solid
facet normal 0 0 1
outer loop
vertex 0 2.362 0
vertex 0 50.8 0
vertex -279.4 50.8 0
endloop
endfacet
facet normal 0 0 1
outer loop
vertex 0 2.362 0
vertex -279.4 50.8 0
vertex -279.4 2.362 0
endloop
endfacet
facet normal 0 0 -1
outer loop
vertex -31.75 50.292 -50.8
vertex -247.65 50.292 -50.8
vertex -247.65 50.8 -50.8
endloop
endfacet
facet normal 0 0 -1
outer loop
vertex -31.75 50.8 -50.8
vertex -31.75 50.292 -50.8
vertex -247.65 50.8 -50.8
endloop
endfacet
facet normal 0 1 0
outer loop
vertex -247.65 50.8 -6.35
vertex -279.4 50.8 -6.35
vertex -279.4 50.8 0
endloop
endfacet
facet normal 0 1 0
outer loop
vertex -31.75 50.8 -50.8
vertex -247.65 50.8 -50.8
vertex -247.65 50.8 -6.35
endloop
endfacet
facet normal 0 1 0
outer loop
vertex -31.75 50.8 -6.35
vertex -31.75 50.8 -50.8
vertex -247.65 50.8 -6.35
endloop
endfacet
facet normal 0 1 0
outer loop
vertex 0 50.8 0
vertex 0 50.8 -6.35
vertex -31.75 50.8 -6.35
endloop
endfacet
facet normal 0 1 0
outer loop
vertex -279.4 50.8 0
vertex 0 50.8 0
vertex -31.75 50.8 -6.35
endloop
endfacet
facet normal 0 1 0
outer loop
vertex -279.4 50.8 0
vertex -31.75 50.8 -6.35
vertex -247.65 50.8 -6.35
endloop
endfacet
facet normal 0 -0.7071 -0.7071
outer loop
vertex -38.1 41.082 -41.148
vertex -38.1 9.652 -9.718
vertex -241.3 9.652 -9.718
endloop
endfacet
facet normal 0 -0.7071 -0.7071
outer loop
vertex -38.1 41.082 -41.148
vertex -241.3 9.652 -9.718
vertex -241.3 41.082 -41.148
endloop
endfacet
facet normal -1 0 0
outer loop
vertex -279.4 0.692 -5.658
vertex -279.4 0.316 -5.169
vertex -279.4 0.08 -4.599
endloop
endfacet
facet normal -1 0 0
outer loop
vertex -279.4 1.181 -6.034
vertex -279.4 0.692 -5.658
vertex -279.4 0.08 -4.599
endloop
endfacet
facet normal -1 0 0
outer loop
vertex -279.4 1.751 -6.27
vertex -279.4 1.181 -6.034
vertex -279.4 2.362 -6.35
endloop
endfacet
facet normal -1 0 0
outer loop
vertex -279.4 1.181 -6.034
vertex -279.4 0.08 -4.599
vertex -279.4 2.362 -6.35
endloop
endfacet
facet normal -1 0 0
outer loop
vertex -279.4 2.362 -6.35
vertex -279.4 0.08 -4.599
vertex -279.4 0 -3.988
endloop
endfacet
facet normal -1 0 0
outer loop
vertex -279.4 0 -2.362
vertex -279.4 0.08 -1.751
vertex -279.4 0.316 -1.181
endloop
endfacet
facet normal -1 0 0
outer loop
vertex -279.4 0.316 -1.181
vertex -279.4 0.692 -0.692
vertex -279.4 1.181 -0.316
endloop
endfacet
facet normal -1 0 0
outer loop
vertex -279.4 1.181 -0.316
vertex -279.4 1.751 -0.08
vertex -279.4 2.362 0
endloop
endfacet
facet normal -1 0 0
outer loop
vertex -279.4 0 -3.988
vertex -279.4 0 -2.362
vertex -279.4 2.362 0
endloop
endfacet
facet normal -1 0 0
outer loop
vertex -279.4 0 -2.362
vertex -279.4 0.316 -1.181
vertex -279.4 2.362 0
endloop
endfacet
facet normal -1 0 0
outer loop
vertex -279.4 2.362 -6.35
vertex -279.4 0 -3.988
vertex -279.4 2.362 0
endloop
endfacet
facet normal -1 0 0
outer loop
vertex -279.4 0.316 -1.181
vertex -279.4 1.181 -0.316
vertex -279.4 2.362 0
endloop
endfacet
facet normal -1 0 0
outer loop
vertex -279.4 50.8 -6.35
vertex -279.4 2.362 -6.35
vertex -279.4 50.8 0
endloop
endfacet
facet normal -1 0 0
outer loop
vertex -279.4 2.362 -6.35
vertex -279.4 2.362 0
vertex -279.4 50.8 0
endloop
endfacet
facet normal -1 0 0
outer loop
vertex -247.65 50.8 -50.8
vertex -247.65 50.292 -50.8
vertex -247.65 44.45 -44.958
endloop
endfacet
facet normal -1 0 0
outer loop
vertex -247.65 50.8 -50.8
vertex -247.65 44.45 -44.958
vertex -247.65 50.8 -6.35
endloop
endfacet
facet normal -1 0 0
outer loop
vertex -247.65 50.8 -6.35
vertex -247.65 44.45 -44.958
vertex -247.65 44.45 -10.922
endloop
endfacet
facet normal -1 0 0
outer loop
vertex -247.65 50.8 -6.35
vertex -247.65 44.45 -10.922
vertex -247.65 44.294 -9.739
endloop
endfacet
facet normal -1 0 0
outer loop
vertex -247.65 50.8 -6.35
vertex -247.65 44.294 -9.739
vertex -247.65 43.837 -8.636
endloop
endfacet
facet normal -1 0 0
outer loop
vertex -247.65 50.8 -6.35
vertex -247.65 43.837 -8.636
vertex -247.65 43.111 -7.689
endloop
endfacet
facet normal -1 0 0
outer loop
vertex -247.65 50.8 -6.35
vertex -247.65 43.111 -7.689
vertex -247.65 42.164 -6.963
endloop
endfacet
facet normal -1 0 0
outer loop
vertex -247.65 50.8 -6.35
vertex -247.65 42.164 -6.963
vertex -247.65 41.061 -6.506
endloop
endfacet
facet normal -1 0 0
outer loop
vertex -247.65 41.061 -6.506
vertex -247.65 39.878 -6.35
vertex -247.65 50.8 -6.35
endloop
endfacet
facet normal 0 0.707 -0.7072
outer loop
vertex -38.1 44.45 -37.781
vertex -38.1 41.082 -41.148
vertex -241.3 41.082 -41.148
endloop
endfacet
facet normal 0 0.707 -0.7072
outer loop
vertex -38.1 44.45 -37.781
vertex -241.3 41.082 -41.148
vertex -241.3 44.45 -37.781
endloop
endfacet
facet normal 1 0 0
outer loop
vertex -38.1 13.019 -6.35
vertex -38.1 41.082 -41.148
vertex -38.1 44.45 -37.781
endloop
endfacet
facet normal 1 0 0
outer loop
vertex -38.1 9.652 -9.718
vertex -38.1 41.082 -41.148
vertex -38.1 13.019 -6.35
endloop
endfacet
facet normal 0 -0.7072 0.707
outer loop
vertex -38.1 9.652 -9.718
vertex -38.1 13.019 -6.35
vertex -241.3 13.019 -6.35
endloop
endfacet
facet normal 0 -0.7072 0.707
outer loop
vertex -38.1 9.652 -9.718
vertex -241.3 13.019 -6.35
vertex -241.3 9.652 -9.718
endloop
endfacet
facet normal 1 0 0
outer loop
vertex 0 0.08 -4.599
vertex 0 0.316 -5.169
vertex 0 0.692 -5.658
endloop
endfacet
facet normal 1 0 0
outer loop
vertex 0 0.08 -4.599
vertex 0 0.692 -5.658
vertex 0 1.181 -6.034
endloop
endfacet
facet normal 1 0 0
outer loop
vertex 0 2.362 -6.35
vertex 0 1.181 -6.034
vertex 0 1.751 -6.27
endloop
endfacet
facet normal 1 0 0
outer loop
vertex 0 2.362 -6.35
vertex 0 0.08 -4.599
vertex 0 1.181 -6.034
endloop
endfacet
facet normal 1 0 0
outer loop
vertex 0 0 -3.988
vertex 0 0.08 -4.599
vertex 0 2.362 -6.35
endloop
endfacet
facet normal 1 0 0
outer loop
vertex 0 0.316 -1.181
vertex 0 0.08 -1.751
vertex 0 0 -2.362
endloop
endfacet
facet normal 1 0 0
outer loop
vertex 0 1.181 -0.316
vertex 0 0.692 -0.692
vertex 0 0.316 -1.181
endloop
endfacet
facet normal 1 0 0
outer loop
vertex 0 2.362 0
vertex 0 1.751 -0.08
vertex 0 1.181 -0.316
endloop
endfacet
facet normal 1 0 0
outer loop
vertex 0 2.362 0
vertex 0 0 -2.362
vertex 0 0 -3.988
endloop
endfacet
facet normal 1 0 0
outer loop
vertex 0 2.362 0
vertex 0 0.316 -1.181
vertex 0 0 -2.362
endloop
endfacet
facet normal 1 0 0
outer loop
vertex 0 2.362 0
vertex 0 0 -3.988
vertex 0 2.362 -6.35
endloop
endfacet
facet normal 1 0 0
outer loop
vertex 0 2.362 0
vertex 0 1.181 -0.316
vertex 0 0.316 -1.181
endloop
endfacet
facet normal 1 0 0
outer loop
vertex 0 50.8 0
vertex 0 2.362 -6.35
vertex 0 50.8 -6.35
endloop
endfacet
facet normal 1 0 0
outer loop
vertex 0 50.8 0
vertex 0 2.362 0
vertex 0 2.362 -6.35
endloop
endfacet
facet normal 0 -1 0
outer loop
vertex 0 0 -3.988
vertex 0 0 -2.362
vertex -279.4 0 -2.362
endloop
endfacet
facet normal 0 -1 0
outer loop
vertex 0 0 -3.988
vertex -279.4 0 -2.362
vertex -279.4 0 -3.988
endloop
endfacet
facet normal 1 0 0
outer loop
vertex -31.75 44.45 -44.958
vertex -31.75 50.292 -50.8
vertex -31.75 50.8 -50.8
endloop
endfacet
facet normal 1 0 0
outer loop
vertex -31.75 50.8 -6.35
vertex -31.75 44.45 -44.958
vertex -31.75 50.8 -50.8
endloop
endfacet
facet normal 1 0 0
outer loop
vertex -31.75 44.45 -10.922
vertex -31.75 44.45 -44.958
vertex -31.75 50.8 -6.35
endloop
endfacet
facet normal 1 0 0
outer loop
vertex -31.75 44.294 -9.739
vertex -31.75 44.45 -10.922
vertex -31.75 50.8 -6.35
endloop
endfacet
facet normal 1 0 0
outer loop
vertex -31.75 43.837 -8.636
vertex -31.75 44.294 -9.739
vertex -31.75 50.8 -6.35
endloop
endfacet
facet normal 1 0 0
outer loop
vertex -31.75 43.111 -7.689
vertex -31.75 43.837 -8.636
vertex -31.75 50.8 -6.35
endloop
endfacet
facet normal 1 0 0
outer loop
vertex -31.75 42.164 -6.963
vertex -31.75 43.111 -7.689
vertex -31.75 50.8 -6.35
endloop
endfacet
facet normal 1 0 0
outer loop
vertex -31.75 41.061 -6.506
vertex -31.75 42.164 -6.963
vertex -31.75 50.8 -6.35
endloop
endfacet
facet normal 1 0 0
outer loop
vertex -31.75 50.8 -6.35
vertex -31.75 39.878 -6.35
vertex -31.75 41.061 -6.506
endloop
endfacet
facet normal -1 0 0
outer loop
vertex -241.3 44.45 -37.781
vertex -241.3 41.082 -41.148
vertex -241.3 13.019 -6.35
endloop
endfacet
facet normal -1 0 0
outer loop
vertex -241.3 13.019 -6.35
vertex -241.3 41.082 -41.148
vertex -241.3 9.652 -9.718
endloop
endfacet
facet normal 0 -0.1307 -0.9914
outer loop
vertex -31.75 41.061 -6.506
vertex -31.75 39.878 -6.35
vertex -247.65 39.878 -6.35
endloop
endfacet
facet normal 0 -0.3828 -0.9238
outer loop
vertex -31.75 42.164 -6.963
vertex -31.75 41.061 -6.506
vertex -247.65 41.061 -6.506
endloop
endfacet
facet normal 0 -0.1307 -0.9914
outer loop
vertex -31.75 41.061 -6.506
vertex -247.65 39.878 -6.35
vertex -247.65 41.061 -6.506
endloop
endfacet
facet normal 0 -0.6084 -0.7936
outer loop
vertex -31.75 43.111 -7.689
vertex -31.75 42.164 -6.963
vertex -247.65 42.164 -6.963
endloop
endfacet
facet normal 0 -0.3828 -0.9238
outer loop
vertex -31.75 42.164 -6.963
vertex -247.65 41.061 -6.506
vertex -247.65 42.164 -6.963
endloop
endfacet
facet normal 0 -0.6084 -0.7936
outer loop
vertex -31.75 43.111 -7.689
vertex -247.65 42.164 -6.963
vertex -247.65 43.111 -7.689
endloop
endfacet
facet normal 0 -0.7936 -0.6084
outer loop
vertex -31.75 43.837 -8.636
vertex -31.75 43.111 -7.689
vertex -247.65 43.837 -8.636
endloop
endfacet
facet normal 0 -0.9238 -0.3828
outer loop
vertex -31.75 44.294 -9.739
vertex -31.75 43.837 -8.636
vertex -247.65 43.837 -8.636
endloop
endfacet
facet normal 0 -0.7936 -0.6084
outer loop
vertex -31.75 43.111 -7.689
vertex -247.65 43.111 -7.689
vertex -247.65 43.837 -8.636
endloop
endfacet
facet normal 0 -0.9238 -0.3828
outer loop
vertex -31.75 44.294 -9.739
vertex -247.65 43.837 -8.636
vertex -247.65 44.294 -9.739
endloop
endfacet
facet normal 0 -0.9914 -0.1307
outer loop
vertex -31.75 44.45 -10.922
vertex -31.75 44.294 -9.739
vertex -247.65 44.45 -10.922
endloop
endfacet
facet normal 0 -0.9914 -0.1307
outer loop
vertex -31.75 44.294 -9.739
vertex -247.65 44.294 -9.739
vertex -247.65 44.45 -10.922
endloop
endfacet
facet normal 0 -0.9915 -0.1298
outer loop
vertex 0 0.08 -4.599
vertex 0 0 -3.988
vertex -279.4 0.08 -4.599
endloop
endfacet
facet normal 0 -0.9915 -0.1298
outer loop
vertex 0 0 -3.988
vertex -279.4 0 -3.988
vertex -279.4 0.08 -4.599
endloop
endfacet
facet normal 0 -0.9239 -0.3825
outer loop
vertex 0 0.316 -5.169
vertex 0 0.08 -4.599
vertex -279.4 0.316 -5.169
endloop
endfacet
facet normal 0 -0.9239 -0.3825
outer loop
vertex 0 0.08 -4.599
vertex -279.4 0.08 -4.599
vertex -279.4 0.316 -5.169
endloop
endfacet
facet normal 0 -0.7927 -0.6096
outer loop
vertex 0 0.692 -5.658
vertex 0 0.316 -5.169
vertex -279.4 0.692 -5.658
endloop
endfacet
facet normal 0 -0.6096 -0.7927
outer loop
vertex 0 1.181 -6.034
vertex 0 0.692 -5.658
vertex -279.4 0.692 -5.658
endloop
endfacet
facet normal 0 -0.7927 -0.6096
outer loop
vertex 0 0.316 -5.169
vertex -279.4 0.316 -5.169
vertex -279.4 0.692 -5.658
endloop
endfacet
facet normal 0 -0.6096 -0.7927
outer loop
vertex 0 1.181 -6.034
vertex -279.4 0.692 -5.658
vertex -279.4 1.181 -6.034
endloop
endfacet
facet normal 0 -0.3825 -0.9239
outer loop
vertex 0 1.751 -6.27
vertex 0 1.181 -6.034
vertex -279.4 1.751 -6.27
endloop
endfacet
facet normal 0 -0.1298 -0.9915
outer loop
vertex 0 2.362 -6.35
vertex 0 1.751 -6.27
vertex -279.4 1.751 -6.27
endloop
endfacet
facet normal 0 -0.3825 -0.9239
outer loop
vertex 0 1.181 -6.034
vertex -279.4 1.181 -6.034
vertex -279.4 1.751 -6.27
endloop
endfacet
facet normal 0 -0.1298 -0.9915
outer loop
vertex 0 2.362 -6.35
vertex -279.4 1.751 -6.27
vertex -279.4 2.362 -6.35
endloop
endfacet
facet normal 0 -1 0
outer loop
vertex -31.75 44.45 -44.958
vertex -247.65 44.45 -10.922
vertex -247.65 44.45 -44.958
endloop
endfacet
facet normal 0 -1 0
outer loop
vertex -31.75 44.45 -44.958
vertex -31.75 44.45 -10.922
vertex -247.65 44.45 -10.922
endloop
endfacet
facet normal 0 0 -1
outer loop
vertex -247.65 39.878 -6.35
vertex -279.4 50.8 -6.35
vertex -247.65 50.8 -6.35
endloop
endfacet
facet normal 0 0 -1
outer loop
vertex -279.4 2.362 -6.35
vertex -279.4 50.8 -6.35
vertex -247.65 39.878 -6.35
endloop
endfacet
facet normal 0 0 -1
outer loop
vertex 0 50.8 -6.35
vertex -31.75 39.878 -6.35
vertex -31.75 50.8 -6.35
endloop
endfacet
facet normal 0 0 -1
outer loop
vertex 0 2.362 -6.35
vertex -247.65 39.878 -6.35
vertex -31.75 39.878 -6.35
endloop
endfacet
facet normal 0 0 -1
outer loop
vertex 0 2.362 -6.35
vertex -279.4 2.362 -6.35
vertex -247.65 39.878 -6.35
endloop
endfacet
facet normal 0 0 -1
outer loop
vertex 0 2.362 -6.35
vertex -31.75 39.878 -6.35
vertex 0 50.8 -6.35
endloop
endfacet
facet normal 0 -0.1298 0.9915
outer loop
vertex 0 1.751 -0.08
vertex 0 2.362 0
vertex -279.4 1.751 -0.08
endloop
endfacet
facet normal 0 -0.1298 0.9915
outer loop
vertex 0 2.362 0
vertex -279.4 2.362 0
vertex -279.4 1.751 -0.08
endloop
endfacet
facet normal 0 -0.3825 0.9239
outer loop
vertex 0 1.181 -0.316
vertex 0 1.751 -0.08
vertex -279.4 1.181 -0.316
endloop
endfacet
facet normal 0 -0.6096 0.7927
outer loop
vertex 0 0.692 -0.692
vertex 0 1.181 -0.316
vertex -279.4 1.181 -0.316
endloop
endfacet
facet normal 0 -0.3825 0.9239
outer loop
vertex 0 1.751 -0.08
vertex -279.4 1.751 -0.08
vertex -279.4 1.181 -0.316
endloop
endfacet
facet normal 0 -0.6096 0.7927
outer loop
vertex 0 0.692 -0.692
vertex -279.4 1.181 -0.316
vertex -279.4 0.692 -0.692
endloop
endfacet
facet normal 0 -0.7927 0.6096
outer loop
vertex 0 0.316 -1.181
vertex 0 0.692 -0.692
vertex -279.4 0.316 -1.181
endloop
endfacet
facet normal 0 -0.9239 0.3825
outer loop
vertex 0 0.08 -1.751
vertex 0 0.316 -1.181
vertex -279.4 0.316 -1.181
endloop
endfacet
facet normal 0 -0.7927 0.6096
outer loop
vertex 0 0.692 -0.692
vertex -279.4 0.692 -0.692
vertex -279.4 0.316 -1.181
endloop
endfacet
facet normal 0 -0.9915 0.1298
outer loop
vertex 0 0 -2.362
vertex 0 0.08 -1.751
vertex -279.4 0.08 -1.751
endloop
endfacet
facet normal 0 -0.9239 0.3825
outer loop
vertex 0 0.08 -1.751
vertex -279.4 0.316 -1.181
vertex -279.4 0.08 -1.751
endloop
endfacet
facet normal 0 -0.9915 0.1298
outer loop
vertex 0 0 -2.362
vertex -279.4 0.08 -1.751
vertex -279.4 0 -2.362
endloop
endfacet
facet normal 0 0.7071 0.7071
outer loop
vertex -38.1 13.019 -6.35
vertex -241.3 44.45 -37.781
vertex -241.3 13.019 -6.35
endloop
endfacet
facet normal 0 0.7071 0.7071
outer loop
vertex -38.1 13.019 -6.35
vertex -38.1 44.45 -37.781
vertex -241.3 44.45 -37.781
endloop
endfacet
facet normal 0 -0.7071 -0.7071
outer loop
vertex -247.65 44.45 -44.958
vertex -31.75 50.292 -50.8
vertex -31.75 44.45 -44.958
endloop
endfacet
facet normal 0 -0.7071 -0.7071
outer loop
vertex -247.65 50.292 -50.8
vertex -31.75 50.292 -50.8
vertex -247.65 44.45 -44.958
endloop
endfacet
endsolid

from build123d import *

# Parameters (mm, degrees)
F1_DEPTH  = 279.4
F2_R      = 2.3622
F4_DEPTH  = 279.4
F5_W      = 38.1
F5_H      = 44.45
F6_DEPTH  = 4.7625
F7_W      = 38.1
F7_H      = 44.45
F8_DEPTH  = 4.7625
F9_W      = 31.75
F9_H      = 44.45
F10_DEPTH = 25.4
F11_W     = 31.75
F11_H     = 50.8
F12_DEPTH = 25.4
F13_R     = 4.572
F14_SIZE  = 5.842


with BuildPart() as f1:
    # F0 (on Right) → F1 (new body)
    with BuildSketch(Plane.YZ):
        Polygon((50.8, 0), (0, 0), (0, -6.35), (44.45, -6.35), (44.45, -50.8), (50.8, -50.8), align=None)
    extrude(amount=-F1_DEPTH)

    # F2
    f2_edges = [f1.edges().sort_by_distance(p)[0] for p in [
        (-139.7, 0, -6.35),
        (-139.7, 0, 0),
    ]]
    fillet(f2_edges, radius=F2_R)

    # F9 (on face) → F10 (cut)
    with BuildSketch(Plane.XZ.offset(-44.45)):
        with Locations((-15.875, -28.575)):
            Rectangle(F9_W, F9_H)
    extrude(amount=-F10_DEPTH, mode=Mode.SUBTRACT)

    # F11 (on face) → F12 (cut)
    with BuildSketch(Plane.XZ.offset(-44.45)):
        with Locations((-263.525, -31.75)):
            Rectangle(F11_W, F11_H)
    extrude(amount=-F12_DEPTH, mode=Mode.SUBTRACT)

    # F13
    f13_edges = [f1.edges().sort_by_distance(p)[0] for p in [
        (-139.7, 44.45, -6.35),
    ]]
    fillet(f13_edges, radius=F13_R)

    # F14
    f14_edges = [f1.edges().sort_by_distance(p)[0] for p in [
        (-139.7, 44.45, -50.8),
    ]]
    chamfer(f14_edges, length=F14_SIZE)


with BuildPart() as f4:
    # F3 (on face) → F4 (new body)
    with BuildSketch(Plane.YZ):
        Polygon((44.45, -37.780896), (13.019104, -6.35), (9.651508, -9.717596), (41.082404, -41.148492), align=None)
    extrude(amount=-F4_DEPTH)

    # F5 (on face) → F6 (cut)
    with BuildSketch(Plane(origin=(0, -0.033044, -0.033044), x_dir=(1, 0, 0), z_dir=(0, -0.707107, -0.707107))):
        with Locations((-260.35, -35.921024)):
            Rectangle(F5_W, F5_H)
    extrude(amount=-F6_DEPTH, mode=Mode.SUBTRACT)

    # F7 (on face) → F8 (cut)
    with BuildSketch(Plane(origin=(0, -0.033044, -0.033044), x_dir=(1, 0, 0), z_dir=(0, -0.707107, -0.707107))):
        with Locations((-19.05, -35.921024)):
            Rectangle(F7_W, F7_H)
    extrude(amount=-F8_DEPTH, mode=Mode.SUBTRACT)


solid = Compound([f1.part, f4.part])
